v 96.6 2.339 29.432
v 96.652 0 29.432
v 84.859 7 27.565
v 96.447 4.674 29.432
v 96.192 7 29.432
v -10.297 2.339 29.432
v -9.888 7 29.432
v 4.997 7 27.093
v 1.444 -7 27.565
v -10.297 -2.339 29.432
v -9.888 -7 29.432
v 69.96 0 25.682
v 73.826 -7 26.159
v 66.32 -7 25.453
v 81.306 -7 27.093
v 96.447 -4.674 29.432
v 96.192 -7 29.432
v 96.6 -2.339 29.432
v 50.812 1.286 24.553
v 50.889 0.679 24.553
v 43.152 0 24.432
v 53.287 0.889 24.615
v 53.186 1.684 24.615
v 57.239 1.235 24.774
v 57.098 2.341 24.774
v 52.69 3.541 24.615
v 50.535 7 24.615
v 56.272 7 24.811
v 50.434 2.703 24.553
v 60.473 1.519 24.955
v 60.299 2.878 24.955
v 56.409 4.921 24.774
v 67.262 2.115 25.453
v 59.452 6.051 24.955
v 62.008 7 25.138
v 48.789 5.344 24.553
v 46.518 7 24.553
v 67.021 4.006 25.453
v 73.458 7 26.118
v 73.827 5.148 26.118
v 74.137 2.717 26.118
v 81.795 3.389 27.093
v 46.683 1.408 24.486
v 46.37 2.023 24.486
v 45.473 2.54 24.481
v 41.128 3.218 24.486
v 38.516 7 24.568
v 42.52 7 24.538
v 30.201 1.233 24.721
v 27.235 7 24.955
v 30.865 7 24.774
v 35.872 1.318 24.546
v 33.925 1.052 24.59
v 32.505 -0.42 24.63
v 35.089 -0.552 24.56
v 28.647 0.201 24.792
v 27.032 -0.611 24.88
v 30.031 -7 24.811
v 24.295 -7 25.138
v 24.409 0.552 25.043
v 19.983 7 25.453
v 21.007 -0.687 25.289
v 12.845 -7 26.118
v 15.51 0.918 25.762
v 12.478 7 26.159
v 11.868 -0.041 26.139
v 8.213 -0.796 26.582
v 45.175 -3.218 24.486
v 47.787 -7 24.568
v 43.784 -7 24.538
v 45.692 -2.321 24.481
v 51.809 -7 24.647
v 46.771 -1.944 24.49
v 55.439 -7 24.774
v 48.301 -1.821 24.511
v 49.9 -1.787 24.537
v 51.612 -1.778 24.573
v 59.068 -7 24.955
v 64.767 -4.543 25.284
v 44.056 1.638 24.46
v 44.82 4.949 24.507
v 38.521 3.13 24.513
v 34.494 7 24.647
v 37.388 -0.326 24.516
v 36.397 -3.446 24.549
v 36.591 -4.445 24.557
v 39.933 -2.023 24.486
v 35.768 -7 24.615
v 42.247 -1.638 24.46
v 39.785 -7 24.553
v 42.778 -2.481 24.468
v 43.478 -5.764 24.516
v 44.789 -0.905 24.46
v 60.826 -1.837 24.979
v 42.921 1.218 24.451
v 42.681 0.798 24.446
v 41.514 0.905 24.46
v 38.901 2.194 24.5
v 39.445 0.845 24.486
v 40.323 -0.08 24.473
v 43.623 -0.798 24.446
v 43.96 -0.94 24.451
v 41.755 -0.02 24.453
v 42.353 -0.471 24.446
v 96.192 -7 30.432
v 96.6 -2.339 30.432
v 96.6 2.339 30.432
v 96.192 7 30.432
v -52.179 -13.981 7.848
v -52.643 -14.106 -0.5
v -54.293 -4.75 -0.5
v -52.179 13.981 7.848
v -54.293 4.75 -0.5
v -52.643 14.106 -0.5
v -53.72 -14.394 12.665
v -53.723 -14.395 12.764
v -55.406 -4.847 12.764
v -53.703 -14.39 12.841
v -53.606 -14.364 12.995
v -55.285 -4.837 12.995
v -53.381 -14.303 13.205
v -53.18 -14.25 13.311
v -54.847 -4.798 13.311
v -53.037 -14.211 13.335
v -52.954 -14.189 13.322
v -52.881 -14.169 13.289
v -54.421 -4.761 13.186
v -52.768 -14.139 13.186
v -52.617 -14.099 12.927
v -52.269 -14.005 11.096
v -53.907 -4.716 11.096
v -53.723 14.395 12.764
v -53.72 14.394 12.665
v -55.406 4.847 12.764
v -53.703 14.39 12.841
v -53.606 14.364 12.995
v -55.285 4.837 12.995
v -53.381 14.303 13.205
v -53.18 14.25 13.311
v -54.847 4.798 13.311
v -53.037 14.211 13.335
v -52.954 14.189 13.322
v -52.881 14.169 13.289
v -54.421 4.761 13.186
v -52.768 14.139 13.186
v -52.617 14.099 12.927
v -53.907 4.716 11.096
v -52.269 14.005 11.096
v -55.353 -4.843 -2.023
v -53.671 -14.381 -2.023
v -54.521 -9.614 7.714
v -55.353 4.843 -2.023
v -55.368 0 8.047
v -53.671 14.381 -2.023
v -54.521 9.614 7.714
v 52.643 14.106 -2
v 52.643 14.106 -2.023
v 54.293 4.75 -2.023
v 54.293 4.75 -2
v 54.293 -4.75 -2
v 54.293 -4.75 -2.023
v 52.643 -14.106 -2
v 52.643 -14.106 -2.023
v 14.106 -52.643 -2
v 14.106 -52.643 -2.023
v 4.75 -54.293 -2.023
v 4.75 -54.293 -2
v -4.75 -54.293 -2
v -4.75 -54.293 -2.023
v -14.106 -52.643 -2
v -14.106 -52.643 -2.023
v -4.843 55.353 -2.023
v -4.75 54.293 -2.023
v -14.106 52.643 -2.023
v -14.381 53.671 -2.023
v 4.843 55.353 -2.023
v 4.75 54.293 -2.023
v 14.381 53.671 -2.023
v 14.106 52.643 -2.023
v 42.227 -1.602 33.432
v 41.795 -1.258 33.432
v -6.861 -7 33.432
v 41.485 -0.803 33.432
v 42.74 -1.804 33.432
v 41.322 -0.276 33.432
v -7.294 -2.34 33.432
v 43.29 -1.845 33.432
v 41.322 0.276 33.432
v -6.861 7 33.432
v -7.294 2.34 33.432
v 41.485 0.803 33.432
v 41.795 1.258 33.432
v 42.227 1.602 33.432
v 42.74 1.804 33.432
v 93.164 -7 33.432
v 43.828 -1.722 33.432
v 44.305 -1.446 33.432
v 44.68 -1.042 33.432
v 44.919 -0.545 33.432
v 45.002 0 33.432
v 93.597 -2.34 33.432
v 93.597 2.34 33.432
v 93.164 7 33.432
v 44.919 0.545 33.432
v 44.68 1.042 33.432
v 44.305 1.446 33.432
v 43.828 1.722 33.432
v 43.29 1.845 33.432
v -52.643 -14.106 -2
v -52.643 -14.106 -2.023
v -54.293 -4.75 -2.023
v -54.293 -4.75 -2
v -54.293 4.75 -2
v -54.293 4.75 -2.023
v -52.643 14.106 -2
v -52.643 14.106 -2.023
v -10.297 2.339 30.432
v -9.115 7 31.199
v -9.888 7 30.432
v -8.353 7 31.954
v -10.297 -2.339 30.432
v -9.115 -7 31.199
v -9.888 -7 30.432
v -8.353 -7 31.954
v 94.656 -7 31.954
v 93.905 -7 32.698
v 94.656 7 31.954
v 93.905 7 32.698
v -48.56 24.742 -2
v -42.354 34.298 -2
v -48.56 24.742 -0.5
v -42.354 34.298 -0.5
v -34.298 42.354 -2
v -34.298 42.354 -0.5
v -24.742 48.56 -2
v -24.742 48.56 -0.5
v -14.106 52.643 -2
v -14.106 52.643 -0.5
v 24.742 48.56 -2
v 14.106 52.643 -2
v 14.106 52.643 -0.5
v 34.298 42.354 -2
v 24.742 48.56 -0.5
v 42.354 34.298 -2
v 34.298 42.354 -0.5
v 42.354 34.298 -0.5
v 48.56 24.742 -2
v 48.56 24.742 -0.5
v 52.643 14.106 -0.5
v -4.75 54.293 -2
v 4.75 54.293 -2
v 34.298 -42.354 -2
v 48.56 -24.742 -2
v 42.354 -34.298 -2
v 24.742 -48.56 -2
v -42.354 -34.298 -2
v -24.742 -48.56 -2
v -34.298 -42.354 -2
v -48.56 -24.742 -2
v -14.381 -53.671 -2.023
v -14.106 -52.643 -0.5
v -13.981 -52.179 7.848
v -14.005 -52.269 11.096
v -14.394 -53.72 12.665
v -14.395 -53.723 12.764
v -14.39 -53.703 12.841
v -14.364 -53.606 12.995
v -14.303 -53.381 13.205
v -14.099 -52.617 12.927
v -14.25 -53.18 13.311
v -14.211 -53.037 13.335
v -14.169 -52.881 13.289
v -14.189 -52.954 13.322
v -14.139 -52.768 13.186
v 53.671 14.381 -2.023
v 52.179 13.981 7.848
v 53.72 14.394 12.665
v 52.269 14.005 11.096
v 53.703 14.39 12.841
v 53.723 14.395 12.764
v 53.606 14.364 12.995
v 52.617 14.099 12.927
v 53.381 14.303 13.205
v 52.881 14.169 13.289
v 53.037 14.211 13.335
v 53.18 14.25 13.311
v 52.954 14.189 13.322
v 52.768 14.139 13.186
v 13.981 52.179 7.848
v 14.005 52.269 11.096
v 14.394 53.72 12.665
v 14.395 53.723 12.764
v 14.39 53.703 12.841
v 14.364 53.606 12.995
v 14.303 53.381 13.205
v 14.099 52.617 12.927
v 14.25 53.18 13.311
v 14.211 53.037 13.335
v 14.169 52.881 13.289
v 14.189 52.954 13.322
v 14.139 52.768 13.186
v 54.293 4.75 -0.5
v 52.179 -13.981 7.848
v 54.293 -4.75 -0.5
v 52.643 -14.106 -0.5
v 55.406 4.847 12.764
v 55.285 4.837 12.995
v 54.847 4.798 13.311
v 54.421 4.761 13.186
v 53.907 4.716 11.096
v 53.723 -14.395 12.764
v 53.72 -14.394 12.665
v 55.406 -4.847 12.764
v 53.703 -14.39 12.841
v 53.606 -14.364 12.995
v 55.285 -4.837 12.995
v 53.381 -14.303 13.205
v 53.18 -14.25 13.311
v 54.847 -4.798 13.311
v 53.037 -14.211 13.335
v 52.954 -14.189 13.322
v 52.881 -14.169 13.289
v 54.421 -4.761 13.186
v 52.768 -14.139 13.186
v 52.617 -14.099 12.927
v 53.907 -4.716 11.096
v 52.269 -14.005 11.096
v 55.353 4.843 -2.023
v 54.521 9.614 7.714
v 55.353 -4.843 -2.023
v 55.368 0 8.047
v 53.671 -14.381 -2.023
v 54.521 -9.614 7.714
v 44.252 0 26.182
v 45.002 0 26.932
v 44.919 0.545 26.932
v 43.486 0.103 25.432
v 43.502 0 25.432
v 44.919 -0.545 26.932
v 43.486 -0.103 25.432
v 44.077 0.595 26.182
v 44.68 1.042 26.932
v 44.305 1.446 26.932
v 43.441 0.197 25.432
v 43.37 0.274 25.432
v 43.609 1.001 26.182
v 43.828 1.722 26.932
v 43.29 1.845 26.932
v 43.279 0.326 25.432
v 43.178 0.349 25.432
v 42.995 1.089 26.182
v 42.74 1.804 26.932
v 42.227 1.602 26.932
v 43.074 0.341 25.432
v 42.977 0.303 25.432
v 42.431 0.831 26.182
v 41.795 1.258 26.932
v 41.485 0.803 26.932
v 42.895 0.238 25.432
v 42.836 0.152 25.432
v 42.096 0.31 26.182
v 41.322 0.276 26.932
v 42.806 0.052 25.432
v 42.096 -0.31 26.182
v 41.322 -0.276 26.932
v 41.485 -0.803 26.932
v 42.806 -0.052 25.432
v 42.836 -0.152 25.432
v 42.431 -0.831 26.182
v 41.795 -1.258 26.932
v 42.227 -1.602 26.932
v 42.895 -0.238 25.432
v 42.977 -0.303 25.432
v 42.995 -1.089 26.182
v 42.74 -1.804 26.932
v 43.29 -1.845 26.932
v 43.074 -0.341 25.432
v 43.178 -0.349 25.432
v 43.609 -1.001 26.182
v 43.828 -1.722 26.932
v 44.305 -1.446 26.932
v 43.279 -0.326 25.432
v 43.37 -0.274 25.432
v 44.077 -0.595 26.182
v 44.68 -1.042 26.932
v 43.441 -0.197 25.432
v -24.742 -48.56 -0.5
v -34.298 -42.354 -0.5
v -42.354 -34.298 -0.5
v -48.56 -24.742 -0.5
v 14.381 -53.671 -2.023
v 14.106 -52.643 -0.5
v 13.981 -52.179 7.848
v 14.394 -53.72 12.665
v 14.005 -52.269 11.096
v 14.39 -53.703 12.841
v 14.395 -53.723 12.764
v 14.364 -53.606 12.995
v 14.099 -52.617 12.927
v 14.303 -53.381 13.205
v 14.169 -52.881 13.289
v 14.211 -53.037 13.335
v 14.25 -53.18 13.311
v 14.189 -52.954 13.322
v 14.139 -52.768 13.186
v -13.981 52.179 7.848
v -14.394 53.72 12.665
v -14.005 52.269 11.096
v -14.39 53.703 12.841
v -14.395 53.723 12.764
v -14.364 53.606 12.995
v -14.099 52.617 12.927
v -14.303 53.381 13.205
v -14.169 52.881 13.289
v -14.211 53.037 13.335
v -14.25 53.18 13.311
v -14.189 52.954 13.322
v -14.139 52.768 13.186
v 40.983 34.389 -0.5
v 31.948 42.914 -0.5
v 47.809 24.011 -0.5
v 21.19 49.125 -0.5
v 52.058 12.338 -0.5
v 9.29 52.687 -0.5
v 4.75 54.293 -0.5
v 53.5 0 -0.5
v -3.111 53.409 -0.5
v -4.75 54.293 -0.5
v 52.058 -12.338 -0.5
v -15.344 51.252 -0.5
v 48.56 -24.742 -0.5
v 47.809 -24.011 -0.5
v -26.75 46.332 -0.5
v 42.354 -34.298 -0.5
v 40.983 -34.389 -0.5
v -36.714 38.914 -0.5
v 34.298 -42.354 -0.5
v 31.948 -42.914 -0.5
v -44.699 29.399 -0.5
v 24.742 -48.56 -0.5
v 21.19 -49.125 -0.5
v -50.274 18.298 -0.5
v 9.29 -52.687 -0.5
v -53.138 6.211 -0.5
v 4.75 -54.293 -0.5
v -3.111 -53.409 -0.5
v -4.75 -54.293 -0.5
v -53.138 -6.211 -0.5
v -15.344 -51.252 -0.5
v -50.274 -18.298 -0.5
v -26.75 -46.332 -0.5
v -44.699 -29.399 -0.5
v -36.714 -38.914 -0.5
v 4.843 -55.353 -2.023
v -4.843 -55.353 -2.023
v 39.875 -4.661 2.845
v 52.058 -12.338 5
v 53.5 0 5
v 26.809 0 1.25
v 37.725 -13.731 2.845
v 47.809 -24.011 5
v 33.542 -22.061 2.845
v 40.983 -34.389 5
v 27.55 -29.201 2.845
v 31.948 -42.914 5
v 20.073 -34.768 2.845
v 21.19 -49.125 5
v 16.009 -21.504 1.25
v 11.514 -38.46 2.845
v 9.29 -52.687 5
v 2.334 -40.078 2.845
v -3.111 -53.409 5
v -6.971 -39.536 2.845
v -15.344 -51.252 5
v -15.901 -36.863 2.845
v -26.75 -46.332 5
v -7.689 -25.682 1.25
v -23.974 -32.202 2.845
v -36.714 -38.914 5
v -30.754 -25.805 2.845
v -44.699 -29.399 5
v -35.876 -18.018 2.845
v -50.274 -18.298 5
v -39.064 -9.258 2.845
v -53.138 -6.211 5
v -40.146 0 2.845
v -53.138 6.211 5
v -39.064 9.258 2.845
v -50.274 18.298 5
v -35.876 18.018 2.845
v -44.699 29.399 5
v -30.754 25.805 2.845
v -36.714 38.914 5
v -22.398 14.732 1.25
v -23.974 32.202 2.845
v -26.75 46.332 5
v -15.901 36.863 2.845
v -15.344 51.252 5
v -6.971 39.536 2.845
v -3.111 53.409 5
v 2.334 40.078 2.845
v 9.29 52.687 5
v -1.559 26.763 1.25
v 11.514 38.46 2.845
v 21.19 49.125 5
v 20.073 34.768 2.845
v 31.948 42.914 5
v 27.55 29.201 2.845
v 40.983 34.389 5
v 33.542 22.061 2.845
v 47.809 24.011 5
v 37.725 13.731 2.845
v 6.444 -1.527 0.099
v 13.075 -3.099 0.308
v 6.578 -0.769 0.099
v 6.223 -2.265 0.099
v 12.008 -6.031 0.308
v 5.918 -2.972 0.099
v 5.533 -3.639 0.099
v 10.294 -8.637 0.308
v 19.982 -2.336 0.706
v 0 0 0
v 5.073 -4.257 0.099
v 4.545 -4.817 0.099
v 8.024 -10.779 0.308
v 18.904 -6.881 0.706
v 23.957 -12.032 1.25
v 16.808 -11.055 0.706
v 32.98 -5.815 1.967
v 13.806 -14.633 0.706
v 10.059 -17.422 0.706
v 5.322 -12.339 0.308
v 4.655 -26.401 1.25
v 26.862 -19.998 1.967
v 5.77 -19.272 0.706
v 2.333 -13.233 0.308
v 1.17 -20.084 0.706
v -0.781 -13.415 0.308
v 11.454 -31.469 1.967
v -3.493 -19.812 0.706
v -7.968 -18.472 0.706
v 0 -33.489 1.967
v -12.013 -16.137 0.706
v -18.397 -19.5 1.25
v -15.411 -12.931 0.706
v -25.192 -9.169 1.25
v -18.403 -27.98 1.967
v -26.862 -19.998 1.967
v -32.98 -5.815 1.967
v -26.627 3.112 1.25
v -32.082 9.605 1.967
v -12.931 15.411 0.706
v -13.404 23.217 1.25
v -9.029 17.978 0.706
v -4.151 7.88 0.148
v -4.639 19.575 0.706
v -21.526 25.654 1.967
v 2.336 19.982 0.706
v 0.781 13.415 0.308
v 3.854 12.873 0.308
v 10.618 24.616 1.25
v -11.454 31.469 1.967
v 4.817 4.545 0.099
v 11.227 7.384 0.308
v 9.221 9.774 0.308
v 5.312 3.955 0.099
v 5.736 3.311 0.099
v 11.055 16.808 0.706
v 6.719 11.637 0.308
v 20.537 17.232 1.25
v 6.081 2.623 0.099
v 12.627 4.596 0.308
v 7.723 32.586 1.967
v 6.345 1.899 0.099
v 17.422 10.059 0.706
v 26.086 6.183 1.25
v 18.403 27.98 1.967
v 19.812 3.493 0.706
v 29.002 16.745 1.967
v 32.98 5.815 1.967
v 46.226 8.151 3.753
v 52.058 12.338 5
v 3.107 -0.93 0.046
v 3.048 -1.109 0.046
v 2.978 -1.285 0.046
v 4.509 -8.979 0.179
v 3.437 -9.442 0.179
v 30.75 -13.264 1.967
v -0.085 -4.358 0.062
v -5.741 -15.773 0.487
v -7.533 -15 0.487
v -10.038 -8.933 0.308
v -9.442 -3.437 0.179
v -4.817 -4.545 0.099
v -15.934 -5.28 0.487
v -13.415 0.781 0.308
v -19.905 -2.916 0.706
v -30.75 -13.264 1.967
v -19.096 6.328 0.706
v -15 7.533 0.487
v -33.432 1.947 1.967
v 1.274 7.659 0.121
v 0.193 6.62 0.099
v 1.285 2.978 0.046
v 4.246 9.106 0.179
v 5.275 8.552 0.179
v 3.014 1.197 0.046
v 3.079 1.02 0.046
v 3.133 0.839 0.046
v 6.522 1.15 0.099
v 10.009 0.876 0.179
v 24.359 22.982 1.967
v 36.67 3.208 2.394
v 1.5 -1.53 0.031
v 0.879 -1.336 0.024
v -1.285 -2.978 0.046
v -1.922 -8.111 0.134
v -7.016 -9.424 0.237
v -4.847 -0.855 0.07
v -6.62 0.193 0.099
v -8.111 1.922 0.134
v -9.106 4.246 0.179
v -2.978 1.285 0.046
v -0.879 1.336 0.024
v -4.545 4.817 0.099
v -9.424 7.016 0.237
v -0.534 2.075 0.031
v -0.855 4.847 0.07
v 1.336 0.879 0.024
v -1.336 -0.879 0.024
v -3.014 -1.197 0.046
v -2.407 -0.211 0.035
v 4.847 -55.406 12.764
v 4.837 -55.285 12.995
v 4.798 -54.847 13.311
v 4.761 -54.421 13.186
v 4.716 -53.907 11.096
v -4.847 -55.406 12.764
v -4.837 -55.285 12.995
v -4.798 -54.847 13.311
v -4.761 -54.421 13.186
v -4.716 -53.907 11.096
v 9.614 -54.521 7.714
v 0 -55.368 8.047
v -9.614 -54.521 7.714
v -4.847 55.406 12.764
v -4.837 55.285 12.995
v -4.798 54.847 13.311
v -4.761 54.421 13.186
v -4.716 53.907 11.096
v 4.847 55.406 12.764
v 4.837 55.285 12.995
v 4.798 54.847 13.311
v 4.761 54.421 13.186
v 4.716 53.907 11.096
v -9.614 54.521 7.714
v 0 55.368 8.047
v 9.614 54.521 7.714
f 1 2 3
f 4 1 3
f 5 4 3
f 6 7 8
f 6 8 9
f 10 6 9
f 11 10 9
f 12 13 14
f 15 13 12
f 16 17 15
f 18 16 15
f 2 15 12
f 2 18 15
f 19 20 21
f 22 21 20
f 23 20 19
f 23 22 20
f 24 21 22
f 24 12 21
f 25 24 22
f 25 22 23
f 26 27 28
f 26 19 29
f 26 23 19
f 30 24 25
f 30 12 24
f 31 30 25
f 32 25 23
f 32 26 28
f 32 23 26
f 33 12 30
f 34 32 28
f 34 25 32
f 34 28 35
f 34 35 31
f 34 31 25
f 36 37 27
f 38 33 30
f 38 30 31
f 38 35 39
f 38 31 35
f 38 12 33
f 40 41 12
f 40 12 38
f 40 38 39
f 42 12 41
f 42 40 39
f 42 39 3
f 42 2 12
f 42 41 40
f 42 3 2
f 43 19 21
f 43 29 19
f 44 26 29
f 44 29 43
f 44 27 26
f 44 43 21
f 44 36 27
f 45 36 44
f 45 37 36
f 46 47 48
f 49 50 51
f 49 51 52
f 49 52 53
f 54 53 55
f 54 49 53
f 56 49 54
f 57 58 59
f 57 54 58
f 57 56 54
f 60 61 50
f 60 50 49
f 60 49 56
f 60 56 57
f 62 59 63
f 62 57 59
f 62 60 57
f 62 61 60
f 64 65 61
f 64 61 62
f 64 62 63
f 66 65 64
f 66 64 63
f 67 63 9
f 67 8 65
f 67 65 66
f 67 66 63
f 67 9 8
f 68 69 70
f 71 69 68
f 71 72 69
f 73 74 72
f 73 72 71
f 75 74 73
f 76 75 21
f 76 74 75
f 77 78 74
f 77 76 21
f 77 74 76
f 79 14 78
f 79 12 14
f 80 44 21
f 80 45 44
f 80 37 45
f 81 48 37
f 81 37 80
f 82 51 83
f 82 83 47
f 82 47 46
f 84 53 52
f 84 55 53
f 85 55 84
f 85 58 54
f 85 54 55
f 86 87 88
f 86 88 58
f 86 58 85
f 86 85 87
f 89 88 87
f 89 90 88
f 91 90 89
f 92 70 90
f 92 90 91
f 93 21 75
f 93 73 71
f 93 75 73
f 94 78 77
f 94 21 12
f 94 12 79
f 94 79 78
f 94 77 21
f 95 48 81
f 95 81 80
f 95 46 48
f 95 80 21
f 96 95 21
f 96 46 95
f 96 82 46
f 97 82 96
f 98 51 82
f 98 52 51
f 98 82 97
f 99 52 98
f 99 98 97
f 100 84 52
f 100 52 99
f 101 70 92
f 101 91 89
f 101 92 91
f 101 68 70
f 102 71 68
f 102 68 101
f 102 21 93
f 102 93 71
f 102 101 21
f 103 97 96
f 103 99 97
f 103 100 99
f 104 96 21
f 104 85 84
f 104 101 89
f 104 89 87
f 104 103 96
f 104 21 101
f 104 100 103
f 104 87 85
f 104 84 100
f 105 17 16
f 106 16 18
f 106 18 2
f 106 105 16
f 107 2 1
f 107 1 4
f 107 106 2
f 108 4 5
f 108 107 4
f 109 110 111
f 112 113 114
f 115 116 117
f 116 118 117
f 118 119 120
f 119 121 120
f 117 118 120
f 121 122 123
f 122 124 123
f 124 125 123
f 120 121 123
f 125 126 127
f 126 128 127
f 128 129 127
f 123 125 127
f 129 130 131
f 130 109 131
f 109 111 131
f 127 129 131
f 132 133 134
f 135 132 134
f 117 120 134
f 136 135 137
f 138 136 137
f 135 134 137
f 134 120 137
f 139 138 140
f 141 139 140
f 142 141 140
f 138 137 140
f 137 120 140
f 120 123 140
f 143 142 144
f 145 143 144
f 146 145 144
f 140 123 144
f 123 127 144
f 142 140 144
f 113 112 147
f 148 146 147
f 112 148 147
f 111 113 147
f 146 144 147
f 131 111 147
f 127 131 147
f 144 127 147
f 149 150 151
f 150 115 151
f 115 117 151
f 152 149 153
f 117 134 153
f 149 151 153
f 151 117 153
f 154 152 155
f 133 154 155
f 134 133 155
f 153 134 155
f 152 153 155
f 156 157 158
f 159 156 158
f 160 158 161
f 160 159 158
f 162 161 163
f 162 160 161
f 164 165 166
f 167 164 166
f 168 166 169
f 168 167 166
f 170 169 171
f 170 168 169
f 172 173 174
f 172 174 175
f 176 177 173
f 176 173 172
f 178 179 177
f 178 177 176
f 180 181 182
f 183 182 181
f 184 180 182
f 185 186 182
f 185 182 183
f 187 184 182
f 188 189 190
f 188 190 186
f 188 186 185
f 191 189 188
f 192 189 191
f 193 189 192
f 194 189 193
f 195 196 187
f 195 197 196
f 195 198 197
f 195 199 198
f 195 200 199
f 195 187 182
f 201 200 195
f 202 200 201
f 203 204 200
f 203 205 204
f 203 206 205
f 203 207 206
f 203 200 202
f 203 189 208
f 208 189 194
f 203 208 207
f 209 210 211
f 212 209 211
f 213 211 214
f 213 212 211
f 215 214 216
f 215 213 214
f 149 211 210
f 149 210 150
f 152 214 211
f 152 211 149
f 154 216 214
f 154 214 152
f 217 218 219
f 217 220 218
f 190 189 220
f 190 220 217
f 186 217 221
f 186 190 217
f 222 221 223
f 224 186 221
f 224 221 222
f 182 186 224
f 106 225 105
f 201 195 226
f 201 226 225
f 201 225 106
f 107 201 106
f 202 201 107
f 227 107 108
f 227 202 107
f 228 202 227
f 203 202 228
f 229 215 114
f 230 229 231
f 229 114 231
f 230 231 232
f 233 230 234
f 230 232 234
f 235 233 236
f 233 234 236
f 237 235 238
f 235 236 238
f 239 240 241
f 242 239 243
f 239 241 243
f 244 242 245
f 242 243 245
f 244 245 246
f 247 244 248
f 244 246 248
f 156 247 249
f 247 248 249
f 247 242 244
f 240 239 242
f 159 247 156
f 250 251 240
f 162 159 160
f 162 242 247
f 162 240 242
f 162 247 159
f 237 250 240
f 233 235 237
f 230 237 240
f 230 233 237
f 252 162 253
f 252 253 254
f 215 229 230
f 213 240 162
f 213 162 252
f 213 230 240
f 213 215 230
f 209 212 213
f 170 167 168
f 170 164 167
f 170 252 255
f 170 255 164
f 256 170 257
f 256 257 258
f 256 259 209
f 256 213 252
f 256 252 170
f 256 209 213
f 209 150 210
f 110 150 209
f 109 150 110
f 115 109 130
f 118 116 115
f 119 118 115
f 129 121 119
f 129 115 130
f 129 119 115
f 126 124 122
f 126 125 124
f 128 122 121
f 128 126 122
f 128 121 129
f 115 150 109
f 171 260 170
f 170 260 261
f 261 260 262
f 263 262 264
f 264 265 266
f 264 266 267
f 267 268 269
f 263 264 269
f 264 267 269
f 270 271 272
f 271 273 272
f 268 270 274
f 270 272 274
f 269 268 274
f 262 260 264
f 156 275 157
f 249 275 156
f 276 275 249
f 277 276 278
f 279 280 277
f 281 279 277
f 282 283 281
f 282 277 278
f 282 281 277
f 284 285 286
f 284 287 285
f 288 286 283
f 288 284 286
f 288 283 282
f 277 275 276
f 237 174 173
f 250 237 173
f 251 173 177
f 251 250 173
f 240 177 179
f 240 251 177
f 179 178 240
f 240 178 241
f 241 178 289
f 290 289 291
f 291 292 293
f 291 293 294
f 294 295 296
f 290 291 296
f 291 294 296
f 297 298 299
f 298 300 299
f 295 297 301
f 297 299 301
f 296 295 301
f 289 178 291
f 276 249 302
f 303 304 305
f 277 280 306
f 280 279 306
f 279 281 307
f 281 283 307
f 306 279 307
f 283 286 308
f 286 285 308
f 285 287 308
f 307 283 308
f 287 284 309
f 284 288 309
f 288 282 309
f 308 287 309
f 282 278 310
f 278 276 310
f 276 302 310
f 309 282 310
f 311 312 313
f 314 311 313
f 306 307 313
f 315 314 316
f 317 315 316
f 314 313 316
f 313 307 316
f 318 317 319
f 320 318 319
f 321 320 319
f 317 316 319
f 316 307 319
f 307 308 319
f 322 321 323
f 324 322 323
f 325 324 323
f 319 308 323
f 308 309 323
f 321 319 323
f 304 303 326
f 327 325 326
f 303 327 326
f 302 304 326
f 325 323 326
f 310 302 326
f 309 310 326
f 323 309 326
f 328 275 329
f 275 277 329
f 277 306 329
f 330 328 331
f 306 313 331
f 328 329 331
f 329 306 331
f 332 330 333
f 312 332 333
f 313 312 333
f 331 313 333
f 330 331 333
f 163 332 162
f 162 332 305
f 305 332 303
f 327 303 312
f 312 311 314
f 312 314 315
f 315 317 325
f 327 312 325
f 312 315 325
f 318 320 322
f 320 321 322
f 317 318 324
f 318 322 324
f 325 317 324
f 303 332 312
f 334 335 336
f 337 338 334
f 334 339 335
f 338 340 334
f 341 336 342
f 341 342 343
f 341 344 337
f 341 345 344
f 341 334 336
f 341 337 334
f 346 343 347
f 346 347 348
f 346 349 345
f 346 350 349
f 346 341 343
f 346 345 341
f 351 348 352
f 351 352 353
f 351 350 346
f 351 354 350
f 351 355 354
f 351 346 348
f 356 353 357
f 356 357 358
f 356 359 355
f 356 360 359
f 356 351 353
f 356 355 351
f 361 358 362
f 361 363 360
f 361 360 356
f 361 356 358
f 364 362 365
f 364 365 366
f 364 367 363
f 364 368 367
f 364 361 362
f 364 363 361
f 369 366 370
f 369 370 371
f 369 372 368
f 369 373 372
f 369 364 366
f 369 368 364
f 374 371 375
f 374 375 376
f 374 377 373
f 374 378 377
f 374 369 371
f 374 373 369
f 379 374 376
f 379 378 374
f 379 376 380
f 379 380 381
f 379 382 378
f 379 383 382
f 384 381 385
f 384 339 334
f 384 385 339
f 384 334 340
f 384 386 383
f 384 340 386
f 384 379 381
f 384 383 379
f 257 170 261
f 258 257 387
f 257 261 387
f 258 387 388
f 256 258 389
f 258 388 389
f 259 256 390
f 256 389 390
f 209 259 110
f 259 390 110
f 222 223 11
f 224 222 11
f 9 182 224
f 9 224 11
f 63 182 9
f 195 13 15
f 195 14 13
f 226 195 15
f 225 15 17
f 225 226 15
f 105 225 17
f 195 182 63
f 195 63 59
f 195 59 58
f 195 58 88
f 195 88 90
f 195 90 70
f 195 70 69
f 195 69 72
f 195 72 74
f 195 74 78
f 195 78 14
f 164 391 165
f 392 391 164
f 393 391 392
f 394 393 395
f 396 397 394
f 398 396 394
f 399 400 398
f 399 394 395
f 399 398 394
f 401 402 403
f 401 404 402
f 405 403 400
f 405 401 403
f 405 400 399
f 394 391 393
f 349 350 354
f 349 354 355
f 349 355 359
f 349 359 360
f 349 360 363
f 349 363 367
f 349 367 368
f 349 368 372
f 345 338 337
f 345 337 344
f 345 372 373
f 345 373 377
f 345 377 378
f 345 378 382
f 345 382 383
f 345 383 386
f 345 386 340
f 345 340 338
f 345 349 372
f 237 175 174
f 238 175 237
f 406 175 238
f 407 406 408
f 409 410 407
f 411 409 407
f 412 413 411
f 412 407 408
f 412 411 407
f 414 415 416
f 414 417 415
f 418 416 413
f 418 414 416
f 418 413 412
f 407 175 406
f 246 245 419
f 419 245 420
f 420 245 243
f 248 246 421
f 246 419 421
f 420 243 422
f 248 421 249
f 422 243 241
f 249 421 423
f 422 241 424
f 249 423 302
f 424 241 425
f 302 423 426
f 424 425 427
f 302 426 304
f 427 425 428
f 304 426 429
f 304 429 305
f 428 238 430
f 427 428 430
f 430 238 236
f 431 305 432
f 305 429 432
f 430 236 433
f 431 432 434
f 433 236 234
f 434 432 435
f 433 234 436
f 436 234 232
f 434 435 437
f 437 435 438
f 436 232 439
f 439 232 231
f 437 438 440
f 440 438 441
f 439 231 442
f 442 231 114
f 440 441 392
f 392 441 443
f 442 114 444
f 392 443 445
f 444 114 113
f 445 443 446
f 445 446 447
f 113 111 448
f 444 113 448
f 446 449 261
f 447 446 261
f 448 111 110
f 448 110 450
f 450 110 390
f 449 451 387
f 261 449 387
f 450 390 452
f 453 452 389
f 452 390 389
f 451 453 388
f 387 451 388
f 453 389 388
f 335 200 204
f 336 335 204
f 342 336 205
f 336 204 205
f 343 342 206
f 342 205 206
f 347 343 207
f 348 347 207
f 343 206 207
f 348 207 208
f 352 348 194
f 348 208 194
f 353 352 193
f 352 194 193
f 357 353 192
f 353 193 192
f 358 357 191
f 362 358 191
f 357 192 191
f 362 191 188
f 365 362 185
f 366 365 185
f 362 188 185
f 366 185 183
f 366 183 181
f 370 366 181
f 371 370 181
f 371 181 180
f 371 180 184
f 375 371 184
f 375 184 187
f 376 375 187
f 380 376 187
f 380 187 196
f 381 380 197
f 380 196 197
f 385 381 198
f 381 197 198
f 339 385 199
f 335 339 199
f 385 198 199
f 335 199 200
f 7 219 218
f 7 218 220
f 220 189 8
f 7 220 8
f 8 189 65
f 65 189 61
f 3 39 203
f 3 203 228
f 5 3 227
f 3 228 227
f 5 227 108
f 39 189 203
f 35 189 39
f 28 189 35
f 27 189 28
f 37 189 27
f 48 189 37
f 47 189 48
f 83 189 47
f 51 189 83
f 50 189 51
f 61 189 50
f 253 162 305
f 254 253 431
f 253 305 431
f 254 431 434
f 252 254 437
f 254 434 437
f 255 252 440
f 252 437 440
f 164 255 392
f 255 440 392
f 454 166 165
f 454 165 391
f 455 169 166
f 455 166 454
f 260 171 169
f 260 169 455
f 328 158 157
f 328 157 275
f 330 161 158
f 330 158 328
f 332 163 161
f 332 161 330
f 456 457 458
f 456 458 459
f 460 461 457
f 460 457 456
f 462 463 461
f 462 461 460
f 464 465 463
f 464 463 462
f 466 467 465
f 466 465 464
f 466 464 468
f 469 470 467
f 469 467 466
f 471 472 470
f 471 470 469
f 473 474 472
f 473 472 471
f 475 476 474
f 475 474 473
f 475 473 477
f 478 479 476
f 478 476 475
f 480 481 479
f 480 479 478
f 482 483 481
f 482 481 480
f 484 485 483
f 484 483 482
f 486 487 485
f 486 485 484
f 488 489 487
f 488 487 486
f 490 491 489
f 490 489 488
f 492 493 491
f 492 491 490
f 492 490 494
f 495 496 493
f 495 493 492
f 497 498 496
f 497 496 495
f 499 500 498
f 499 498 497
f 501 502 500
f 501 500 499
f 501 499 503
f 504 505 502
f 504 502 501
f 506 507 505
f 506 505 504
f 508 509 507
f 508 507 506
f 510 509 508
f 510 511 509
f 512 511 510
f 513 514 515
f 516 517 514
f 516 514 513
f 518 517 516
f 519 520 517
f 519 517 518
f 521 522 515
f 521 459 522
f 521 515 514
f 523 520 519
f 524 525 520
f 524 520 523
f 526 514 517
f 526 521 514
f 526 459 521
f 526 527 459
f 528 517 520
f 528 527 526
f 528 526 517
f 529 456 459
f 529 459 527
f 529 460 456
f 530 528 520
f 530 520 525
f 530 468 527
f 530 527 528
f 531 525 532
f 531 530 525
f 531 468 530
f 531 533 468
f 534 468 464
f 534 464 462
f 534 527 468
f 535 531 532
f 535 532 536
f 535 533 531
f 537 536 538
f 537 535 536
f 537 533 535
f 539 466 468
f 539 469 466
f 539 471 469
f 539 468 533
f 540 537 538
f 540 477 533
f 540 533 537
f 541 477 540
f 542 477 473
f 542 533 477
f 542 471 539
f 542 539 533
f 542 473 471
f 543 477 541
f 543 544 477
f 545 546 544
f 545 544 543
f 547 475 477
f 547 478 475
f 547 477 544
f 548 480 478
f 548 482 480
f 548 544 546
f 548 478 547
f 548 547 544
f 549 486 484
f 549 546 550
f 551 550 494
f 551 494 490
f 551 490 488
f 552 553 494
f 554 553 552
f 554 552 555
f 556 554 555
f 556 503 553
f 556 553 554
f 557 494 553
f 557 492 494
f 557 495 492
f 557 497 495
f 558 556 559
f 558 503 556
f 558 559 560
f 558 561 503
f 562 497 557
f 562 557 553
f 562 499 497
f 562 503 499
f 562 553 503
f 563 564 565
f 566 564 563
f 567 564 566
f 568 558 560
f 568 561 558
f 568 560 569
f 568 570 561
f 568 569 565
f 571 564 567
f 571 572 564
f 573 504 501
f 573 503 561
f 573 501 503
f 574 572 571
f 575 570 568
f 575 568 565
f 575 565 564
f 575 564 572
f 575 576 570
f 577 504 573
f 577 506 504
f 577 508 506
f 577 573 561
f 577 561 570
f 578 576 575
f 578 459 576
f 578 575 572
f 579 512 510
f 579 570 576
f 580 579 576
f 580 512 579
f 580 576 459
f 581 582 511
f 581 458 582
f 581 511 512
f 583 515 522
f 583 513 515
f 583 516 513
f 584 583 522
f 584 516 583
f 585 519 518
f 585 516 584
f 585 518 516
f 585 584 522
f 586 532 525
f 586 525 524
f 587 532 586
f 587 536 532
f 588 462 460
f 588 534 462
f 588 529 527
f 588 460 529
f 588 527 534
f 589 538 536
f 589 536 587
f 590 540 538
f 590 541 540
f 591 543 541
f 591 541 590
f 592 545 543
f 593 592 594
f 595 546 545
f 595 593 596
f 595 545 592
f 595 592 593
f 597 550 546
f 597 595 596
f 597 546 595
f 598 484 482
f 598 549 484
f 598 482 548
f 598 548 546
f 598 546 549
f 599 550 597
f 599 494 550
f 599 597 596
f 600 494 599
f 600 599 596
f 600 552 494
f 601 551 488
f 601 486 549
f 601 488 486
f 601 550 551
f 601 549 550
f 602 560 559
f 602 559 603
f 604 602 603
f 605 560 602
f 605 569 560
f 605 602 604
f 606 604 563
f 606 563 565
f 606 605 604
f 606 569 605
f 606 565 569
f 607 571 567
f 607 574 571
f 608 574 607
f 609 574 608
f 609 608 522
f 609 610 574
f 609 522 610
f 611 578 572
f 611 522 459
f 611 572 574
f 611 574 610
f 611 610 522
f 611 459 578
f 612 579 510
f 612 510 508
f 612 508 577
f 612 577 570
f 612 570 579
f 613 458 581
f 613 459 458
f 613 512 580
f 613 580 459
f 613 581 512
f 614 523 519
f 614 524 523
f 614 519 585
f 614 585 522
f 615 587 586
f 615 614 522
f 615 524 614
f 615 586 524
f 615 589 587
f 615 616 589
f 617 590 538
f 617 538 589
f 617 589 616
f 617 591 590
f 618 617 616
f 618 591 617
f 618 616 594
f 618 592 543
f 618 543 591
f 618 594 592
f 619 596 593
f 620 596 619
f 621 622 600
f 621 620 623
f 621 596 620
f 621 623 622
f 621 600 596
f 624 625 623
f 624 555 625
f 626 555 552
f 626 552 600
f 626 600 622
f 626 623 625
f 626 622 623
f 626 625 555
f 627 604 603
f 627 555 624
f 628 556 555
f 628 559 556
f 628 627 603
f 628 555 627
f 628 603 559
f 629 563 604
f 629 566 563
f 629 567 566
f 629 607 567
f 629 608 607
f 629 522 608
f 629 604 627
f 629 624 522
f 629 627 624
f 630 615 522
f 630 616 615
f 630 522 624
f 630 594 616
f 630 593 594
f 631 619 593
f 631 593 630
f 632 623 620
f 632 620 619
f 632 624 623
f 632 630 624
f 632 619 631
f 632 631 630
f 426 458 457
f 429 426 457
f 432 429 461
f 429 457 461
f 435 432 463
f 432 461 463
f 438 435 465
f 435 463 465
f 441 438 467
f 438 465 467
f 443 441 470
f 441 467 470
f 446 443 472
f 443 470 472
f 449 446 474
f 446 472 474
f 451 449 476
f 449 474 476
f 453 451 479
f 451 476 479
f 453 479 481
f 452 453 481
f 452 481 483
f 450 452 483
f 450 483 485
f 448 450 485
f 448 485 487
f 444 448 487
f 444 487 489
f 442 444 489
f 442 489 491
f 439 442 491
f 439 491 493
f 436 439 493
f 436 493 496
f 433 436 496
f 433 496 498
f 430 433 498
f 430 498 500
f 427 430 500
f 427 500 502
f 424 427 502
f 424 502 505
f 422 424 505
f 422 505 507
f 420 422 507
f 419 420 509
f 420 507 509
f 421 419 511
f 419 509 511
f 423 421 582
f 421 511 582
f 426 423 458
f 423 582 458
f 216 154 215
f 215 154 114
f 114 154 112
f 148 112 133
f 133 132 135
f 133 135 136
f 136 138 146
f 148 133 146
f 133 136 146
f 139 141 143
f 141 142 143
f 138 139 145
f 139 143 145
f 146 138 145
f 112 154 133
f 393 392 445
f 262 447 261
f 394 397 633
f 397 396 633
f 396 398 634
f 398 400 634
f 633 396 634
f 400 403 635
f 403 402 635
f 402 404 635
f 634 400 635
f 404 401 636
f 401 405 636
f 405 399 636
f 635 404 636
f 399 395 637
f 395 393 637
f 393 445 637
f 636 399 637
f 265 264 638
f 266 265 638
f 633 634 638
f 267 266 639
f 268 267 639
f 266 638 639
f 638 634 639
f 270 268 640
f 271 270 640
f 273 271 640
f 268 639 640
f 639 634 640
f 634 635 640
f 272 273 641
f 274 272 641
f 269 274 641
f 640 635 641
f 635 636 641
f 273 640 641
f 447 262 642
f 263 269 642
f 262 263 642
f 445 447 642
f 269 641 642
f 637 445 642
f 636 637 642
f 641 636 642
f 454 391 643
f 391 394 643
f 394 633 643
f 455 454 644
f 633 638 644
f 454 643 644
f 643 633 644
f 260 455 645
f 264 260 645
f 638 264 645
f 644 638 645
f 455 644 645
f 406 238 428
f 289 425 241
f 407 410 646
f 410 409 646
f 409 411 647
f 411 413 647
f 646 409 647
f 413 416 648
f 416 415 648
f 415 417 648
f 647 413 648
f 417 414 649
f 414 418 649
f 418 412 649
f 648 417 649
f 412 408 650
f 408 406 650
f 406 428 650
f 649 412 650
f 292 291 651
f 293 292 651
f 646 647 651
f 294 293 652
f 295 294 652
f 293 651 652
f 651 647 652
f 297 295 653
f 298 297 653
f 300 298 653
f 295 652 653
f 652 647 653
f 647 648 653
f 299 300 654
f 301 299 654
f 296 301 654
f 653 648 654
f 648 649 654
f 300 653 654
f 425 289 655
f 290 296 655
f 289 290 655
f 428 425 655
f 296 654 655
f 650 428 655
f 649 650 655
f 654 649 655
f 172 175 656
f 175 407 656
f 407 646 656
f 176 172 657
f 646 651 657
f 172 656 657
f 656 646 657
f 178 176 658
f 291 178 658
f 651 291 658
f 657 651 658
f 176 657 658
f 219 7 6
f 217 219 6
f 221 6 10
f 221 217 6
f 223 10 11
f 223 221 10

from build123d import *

# Parameters (mm, degrees)
F2_W          = 1
F2_H          = 1.5
F5_ANGLE_BACK = 15
F5_ANGLE      = 30
F6_COUNT      = 4
F9_R          = 1.85
F10_DEPTH     = 8
F11_SIZE      = 1.5
F13_W         = 113.6754006147
F13_H         = 18.7160558999
F14_DEPTH     = 50
F16_W         = 117.0245949179
F16_H         = 20.686166361
F17_DEPTH     = 50


with BuildPart() as f1:
    # F0 (on Front) → F1 (revolve)
    with BuildSketch(Plane.XZ):
        with BuildLine():
            Line((53.5, -2), (53.5, 0))
            Line((53.5, 0), (53.5, 5))
            add(Edge.make_bspline(
                [(0, 0), (3.3454558218, 0.0542717682), (10.8090176432, 0.1062614393), (21.371548013, 0.7475503182), (32.1492656057, 1.7069419401), (42.6974755209, 3.2325135719), (50.1874747626, 4.1258961012), (53.5, 5)],
                knots=[0, 0, 0, 0, 0.1994469438, 0.399033057, 0.5988966387, 0.7991742689, 1, 1, 1, 1], degree=3))
            Line((0, 0), (0, -2))
            Line((0, -2), (53.5, -2))
        make_face()
    revolve(axis=Axis((0, 0, 3.1526437961), (0, 0, -1)))

    # F2 (on Right) → F3 (revolve)
    with BuildSketch(Plane.YZ):
        with Locations((-54, -1.25)):
            Rectangle(F2_W, F2_H)
    revolve(axis=Axis((0, 0, -2), (0, 0, -1)))

    # F4 (on Right) → F5 (revolve)
    with BuildSketch(Plane.YZ, mode=Mode.PRIVATE) as f5_sk:
        with BuildLine():
            Line((-54.5, -2.0231393045), (-54.5, -0.5))
            add(Edge.make_bspline(
                [(-55.5645613074, -2.0231393045), (-55.1740945906, 4.6268983834), (-55.4294740387, 12.2768407368), (-55.6964571803, 12.8692312974), (-53.6796113799, 14.6594986263), (-53.8867457037, 6.2576345636), (-54.5, -0.5)],
                knots=[0, 0, 0, 0, 0.417747256, 0.4904972457, 0.5919153843, 1, 1, 1, 1], degree=3))
            Line((-55.5645613074, -2.0231393045), (-54.5, -2.0231393045))
        make_face()
    revolve(f5_sk.sketch.rotate(Axis((0, 0, 5), (0, 0, -1)), -F5_ANGLE_BACK), axis=Axis((0, 0, 5), (0, 0, -1)), revolution_arc=F5_ANGLE)

    # F6: F1 ×4 about axis
    f6_axis = Axis((0, 0, 5), (0, 0, -1))


with BuildPart() as f1_1:
    add(f1.part)
    for i in range(1, F6_COUNT):
        add(f1.part.rotate(f6_axis, i * 360 / F6_COUNT))


with BuildPart() as f8:
    # F7 (on Front) → F8 (revolve)
    with BuildSketch(Plane.XZ):
        with BuildLine():
            Line((43.1516239118, 30.4319373556), (43.1516239118, 24.4319373556))
            add(Edge.make_bspline(
                [(43.1516239118, 24.4319373556), (46.4970797336, 24.4862091238), (53.960641555, 24.5381987949), (64.5231719249, 25.1794876738), (75.3008895176, 26.1388792956), (85.8490994327, 27.6644509275), (93.3390986744, 28.5578334567), (96.6516239118, 29.4319373556)],
                knots=[0, 0, 0, 0, 0.1994469438, 0.399033057, 0.5988966387, 0.7991742689, 1, 1, 1, 1], degree=3))
            Line((96.6516239118, 29.4319373556), (96.6516239118, 30.4319373556))
            Line((96.6516239118, 30.4319373556), (93.6516239118, 33.4319373556))
            Line((93.6516239118, 33.4319373556), (43.1516239118, 33.4319373556))
            Line((43.1516239118, 33.4319373556), (43.1516239118, 30.4319373556))
        make_face()
    revolve(axis=Axis((43.1516239118, 0, 31.3791711722), (0, 0, 1)))

    # F9 (on face) → F10 (cut)
    with BuildSketch(Plane.XY.offset(33.4319373556)):
        with Locations((43.1516239118, 0)):
            Circle(F9_R)
    extrude(amount=-F10_DEPTH, mode=Mode.SUBTRACT)

    # F11
    f11_edges = [f8.edges().sort_by_distance(p)[0] for p in [
        (41.301624, 0, 25.431937),
    ]]
    chamfer(f11_edges, length=F11_SIZE)

    # F13 (on offset) → F14 (cut)
    with BuildSketch(Plane.XZ.offset(7)):
        with Locations((42.5405576825, 29.5516643673)):
            Rectangle(F13_W, F13_H)
    extrude(amount=F14_DEPTH, mode=Mode.SUBTRACT)

    # F16 (on offset) → F17 (cut)
    with BuildSketch(Plane.XZ.offset(-7)):
        with Locations((44.6091843769, 29.1576413438)):
            Rectangle(F16_W, F16_H)
    extrude(amount=-F17_DEPTH, mode=Mode.SUBTRACT)


solid = Compound([f1_1.part, f8.part])
